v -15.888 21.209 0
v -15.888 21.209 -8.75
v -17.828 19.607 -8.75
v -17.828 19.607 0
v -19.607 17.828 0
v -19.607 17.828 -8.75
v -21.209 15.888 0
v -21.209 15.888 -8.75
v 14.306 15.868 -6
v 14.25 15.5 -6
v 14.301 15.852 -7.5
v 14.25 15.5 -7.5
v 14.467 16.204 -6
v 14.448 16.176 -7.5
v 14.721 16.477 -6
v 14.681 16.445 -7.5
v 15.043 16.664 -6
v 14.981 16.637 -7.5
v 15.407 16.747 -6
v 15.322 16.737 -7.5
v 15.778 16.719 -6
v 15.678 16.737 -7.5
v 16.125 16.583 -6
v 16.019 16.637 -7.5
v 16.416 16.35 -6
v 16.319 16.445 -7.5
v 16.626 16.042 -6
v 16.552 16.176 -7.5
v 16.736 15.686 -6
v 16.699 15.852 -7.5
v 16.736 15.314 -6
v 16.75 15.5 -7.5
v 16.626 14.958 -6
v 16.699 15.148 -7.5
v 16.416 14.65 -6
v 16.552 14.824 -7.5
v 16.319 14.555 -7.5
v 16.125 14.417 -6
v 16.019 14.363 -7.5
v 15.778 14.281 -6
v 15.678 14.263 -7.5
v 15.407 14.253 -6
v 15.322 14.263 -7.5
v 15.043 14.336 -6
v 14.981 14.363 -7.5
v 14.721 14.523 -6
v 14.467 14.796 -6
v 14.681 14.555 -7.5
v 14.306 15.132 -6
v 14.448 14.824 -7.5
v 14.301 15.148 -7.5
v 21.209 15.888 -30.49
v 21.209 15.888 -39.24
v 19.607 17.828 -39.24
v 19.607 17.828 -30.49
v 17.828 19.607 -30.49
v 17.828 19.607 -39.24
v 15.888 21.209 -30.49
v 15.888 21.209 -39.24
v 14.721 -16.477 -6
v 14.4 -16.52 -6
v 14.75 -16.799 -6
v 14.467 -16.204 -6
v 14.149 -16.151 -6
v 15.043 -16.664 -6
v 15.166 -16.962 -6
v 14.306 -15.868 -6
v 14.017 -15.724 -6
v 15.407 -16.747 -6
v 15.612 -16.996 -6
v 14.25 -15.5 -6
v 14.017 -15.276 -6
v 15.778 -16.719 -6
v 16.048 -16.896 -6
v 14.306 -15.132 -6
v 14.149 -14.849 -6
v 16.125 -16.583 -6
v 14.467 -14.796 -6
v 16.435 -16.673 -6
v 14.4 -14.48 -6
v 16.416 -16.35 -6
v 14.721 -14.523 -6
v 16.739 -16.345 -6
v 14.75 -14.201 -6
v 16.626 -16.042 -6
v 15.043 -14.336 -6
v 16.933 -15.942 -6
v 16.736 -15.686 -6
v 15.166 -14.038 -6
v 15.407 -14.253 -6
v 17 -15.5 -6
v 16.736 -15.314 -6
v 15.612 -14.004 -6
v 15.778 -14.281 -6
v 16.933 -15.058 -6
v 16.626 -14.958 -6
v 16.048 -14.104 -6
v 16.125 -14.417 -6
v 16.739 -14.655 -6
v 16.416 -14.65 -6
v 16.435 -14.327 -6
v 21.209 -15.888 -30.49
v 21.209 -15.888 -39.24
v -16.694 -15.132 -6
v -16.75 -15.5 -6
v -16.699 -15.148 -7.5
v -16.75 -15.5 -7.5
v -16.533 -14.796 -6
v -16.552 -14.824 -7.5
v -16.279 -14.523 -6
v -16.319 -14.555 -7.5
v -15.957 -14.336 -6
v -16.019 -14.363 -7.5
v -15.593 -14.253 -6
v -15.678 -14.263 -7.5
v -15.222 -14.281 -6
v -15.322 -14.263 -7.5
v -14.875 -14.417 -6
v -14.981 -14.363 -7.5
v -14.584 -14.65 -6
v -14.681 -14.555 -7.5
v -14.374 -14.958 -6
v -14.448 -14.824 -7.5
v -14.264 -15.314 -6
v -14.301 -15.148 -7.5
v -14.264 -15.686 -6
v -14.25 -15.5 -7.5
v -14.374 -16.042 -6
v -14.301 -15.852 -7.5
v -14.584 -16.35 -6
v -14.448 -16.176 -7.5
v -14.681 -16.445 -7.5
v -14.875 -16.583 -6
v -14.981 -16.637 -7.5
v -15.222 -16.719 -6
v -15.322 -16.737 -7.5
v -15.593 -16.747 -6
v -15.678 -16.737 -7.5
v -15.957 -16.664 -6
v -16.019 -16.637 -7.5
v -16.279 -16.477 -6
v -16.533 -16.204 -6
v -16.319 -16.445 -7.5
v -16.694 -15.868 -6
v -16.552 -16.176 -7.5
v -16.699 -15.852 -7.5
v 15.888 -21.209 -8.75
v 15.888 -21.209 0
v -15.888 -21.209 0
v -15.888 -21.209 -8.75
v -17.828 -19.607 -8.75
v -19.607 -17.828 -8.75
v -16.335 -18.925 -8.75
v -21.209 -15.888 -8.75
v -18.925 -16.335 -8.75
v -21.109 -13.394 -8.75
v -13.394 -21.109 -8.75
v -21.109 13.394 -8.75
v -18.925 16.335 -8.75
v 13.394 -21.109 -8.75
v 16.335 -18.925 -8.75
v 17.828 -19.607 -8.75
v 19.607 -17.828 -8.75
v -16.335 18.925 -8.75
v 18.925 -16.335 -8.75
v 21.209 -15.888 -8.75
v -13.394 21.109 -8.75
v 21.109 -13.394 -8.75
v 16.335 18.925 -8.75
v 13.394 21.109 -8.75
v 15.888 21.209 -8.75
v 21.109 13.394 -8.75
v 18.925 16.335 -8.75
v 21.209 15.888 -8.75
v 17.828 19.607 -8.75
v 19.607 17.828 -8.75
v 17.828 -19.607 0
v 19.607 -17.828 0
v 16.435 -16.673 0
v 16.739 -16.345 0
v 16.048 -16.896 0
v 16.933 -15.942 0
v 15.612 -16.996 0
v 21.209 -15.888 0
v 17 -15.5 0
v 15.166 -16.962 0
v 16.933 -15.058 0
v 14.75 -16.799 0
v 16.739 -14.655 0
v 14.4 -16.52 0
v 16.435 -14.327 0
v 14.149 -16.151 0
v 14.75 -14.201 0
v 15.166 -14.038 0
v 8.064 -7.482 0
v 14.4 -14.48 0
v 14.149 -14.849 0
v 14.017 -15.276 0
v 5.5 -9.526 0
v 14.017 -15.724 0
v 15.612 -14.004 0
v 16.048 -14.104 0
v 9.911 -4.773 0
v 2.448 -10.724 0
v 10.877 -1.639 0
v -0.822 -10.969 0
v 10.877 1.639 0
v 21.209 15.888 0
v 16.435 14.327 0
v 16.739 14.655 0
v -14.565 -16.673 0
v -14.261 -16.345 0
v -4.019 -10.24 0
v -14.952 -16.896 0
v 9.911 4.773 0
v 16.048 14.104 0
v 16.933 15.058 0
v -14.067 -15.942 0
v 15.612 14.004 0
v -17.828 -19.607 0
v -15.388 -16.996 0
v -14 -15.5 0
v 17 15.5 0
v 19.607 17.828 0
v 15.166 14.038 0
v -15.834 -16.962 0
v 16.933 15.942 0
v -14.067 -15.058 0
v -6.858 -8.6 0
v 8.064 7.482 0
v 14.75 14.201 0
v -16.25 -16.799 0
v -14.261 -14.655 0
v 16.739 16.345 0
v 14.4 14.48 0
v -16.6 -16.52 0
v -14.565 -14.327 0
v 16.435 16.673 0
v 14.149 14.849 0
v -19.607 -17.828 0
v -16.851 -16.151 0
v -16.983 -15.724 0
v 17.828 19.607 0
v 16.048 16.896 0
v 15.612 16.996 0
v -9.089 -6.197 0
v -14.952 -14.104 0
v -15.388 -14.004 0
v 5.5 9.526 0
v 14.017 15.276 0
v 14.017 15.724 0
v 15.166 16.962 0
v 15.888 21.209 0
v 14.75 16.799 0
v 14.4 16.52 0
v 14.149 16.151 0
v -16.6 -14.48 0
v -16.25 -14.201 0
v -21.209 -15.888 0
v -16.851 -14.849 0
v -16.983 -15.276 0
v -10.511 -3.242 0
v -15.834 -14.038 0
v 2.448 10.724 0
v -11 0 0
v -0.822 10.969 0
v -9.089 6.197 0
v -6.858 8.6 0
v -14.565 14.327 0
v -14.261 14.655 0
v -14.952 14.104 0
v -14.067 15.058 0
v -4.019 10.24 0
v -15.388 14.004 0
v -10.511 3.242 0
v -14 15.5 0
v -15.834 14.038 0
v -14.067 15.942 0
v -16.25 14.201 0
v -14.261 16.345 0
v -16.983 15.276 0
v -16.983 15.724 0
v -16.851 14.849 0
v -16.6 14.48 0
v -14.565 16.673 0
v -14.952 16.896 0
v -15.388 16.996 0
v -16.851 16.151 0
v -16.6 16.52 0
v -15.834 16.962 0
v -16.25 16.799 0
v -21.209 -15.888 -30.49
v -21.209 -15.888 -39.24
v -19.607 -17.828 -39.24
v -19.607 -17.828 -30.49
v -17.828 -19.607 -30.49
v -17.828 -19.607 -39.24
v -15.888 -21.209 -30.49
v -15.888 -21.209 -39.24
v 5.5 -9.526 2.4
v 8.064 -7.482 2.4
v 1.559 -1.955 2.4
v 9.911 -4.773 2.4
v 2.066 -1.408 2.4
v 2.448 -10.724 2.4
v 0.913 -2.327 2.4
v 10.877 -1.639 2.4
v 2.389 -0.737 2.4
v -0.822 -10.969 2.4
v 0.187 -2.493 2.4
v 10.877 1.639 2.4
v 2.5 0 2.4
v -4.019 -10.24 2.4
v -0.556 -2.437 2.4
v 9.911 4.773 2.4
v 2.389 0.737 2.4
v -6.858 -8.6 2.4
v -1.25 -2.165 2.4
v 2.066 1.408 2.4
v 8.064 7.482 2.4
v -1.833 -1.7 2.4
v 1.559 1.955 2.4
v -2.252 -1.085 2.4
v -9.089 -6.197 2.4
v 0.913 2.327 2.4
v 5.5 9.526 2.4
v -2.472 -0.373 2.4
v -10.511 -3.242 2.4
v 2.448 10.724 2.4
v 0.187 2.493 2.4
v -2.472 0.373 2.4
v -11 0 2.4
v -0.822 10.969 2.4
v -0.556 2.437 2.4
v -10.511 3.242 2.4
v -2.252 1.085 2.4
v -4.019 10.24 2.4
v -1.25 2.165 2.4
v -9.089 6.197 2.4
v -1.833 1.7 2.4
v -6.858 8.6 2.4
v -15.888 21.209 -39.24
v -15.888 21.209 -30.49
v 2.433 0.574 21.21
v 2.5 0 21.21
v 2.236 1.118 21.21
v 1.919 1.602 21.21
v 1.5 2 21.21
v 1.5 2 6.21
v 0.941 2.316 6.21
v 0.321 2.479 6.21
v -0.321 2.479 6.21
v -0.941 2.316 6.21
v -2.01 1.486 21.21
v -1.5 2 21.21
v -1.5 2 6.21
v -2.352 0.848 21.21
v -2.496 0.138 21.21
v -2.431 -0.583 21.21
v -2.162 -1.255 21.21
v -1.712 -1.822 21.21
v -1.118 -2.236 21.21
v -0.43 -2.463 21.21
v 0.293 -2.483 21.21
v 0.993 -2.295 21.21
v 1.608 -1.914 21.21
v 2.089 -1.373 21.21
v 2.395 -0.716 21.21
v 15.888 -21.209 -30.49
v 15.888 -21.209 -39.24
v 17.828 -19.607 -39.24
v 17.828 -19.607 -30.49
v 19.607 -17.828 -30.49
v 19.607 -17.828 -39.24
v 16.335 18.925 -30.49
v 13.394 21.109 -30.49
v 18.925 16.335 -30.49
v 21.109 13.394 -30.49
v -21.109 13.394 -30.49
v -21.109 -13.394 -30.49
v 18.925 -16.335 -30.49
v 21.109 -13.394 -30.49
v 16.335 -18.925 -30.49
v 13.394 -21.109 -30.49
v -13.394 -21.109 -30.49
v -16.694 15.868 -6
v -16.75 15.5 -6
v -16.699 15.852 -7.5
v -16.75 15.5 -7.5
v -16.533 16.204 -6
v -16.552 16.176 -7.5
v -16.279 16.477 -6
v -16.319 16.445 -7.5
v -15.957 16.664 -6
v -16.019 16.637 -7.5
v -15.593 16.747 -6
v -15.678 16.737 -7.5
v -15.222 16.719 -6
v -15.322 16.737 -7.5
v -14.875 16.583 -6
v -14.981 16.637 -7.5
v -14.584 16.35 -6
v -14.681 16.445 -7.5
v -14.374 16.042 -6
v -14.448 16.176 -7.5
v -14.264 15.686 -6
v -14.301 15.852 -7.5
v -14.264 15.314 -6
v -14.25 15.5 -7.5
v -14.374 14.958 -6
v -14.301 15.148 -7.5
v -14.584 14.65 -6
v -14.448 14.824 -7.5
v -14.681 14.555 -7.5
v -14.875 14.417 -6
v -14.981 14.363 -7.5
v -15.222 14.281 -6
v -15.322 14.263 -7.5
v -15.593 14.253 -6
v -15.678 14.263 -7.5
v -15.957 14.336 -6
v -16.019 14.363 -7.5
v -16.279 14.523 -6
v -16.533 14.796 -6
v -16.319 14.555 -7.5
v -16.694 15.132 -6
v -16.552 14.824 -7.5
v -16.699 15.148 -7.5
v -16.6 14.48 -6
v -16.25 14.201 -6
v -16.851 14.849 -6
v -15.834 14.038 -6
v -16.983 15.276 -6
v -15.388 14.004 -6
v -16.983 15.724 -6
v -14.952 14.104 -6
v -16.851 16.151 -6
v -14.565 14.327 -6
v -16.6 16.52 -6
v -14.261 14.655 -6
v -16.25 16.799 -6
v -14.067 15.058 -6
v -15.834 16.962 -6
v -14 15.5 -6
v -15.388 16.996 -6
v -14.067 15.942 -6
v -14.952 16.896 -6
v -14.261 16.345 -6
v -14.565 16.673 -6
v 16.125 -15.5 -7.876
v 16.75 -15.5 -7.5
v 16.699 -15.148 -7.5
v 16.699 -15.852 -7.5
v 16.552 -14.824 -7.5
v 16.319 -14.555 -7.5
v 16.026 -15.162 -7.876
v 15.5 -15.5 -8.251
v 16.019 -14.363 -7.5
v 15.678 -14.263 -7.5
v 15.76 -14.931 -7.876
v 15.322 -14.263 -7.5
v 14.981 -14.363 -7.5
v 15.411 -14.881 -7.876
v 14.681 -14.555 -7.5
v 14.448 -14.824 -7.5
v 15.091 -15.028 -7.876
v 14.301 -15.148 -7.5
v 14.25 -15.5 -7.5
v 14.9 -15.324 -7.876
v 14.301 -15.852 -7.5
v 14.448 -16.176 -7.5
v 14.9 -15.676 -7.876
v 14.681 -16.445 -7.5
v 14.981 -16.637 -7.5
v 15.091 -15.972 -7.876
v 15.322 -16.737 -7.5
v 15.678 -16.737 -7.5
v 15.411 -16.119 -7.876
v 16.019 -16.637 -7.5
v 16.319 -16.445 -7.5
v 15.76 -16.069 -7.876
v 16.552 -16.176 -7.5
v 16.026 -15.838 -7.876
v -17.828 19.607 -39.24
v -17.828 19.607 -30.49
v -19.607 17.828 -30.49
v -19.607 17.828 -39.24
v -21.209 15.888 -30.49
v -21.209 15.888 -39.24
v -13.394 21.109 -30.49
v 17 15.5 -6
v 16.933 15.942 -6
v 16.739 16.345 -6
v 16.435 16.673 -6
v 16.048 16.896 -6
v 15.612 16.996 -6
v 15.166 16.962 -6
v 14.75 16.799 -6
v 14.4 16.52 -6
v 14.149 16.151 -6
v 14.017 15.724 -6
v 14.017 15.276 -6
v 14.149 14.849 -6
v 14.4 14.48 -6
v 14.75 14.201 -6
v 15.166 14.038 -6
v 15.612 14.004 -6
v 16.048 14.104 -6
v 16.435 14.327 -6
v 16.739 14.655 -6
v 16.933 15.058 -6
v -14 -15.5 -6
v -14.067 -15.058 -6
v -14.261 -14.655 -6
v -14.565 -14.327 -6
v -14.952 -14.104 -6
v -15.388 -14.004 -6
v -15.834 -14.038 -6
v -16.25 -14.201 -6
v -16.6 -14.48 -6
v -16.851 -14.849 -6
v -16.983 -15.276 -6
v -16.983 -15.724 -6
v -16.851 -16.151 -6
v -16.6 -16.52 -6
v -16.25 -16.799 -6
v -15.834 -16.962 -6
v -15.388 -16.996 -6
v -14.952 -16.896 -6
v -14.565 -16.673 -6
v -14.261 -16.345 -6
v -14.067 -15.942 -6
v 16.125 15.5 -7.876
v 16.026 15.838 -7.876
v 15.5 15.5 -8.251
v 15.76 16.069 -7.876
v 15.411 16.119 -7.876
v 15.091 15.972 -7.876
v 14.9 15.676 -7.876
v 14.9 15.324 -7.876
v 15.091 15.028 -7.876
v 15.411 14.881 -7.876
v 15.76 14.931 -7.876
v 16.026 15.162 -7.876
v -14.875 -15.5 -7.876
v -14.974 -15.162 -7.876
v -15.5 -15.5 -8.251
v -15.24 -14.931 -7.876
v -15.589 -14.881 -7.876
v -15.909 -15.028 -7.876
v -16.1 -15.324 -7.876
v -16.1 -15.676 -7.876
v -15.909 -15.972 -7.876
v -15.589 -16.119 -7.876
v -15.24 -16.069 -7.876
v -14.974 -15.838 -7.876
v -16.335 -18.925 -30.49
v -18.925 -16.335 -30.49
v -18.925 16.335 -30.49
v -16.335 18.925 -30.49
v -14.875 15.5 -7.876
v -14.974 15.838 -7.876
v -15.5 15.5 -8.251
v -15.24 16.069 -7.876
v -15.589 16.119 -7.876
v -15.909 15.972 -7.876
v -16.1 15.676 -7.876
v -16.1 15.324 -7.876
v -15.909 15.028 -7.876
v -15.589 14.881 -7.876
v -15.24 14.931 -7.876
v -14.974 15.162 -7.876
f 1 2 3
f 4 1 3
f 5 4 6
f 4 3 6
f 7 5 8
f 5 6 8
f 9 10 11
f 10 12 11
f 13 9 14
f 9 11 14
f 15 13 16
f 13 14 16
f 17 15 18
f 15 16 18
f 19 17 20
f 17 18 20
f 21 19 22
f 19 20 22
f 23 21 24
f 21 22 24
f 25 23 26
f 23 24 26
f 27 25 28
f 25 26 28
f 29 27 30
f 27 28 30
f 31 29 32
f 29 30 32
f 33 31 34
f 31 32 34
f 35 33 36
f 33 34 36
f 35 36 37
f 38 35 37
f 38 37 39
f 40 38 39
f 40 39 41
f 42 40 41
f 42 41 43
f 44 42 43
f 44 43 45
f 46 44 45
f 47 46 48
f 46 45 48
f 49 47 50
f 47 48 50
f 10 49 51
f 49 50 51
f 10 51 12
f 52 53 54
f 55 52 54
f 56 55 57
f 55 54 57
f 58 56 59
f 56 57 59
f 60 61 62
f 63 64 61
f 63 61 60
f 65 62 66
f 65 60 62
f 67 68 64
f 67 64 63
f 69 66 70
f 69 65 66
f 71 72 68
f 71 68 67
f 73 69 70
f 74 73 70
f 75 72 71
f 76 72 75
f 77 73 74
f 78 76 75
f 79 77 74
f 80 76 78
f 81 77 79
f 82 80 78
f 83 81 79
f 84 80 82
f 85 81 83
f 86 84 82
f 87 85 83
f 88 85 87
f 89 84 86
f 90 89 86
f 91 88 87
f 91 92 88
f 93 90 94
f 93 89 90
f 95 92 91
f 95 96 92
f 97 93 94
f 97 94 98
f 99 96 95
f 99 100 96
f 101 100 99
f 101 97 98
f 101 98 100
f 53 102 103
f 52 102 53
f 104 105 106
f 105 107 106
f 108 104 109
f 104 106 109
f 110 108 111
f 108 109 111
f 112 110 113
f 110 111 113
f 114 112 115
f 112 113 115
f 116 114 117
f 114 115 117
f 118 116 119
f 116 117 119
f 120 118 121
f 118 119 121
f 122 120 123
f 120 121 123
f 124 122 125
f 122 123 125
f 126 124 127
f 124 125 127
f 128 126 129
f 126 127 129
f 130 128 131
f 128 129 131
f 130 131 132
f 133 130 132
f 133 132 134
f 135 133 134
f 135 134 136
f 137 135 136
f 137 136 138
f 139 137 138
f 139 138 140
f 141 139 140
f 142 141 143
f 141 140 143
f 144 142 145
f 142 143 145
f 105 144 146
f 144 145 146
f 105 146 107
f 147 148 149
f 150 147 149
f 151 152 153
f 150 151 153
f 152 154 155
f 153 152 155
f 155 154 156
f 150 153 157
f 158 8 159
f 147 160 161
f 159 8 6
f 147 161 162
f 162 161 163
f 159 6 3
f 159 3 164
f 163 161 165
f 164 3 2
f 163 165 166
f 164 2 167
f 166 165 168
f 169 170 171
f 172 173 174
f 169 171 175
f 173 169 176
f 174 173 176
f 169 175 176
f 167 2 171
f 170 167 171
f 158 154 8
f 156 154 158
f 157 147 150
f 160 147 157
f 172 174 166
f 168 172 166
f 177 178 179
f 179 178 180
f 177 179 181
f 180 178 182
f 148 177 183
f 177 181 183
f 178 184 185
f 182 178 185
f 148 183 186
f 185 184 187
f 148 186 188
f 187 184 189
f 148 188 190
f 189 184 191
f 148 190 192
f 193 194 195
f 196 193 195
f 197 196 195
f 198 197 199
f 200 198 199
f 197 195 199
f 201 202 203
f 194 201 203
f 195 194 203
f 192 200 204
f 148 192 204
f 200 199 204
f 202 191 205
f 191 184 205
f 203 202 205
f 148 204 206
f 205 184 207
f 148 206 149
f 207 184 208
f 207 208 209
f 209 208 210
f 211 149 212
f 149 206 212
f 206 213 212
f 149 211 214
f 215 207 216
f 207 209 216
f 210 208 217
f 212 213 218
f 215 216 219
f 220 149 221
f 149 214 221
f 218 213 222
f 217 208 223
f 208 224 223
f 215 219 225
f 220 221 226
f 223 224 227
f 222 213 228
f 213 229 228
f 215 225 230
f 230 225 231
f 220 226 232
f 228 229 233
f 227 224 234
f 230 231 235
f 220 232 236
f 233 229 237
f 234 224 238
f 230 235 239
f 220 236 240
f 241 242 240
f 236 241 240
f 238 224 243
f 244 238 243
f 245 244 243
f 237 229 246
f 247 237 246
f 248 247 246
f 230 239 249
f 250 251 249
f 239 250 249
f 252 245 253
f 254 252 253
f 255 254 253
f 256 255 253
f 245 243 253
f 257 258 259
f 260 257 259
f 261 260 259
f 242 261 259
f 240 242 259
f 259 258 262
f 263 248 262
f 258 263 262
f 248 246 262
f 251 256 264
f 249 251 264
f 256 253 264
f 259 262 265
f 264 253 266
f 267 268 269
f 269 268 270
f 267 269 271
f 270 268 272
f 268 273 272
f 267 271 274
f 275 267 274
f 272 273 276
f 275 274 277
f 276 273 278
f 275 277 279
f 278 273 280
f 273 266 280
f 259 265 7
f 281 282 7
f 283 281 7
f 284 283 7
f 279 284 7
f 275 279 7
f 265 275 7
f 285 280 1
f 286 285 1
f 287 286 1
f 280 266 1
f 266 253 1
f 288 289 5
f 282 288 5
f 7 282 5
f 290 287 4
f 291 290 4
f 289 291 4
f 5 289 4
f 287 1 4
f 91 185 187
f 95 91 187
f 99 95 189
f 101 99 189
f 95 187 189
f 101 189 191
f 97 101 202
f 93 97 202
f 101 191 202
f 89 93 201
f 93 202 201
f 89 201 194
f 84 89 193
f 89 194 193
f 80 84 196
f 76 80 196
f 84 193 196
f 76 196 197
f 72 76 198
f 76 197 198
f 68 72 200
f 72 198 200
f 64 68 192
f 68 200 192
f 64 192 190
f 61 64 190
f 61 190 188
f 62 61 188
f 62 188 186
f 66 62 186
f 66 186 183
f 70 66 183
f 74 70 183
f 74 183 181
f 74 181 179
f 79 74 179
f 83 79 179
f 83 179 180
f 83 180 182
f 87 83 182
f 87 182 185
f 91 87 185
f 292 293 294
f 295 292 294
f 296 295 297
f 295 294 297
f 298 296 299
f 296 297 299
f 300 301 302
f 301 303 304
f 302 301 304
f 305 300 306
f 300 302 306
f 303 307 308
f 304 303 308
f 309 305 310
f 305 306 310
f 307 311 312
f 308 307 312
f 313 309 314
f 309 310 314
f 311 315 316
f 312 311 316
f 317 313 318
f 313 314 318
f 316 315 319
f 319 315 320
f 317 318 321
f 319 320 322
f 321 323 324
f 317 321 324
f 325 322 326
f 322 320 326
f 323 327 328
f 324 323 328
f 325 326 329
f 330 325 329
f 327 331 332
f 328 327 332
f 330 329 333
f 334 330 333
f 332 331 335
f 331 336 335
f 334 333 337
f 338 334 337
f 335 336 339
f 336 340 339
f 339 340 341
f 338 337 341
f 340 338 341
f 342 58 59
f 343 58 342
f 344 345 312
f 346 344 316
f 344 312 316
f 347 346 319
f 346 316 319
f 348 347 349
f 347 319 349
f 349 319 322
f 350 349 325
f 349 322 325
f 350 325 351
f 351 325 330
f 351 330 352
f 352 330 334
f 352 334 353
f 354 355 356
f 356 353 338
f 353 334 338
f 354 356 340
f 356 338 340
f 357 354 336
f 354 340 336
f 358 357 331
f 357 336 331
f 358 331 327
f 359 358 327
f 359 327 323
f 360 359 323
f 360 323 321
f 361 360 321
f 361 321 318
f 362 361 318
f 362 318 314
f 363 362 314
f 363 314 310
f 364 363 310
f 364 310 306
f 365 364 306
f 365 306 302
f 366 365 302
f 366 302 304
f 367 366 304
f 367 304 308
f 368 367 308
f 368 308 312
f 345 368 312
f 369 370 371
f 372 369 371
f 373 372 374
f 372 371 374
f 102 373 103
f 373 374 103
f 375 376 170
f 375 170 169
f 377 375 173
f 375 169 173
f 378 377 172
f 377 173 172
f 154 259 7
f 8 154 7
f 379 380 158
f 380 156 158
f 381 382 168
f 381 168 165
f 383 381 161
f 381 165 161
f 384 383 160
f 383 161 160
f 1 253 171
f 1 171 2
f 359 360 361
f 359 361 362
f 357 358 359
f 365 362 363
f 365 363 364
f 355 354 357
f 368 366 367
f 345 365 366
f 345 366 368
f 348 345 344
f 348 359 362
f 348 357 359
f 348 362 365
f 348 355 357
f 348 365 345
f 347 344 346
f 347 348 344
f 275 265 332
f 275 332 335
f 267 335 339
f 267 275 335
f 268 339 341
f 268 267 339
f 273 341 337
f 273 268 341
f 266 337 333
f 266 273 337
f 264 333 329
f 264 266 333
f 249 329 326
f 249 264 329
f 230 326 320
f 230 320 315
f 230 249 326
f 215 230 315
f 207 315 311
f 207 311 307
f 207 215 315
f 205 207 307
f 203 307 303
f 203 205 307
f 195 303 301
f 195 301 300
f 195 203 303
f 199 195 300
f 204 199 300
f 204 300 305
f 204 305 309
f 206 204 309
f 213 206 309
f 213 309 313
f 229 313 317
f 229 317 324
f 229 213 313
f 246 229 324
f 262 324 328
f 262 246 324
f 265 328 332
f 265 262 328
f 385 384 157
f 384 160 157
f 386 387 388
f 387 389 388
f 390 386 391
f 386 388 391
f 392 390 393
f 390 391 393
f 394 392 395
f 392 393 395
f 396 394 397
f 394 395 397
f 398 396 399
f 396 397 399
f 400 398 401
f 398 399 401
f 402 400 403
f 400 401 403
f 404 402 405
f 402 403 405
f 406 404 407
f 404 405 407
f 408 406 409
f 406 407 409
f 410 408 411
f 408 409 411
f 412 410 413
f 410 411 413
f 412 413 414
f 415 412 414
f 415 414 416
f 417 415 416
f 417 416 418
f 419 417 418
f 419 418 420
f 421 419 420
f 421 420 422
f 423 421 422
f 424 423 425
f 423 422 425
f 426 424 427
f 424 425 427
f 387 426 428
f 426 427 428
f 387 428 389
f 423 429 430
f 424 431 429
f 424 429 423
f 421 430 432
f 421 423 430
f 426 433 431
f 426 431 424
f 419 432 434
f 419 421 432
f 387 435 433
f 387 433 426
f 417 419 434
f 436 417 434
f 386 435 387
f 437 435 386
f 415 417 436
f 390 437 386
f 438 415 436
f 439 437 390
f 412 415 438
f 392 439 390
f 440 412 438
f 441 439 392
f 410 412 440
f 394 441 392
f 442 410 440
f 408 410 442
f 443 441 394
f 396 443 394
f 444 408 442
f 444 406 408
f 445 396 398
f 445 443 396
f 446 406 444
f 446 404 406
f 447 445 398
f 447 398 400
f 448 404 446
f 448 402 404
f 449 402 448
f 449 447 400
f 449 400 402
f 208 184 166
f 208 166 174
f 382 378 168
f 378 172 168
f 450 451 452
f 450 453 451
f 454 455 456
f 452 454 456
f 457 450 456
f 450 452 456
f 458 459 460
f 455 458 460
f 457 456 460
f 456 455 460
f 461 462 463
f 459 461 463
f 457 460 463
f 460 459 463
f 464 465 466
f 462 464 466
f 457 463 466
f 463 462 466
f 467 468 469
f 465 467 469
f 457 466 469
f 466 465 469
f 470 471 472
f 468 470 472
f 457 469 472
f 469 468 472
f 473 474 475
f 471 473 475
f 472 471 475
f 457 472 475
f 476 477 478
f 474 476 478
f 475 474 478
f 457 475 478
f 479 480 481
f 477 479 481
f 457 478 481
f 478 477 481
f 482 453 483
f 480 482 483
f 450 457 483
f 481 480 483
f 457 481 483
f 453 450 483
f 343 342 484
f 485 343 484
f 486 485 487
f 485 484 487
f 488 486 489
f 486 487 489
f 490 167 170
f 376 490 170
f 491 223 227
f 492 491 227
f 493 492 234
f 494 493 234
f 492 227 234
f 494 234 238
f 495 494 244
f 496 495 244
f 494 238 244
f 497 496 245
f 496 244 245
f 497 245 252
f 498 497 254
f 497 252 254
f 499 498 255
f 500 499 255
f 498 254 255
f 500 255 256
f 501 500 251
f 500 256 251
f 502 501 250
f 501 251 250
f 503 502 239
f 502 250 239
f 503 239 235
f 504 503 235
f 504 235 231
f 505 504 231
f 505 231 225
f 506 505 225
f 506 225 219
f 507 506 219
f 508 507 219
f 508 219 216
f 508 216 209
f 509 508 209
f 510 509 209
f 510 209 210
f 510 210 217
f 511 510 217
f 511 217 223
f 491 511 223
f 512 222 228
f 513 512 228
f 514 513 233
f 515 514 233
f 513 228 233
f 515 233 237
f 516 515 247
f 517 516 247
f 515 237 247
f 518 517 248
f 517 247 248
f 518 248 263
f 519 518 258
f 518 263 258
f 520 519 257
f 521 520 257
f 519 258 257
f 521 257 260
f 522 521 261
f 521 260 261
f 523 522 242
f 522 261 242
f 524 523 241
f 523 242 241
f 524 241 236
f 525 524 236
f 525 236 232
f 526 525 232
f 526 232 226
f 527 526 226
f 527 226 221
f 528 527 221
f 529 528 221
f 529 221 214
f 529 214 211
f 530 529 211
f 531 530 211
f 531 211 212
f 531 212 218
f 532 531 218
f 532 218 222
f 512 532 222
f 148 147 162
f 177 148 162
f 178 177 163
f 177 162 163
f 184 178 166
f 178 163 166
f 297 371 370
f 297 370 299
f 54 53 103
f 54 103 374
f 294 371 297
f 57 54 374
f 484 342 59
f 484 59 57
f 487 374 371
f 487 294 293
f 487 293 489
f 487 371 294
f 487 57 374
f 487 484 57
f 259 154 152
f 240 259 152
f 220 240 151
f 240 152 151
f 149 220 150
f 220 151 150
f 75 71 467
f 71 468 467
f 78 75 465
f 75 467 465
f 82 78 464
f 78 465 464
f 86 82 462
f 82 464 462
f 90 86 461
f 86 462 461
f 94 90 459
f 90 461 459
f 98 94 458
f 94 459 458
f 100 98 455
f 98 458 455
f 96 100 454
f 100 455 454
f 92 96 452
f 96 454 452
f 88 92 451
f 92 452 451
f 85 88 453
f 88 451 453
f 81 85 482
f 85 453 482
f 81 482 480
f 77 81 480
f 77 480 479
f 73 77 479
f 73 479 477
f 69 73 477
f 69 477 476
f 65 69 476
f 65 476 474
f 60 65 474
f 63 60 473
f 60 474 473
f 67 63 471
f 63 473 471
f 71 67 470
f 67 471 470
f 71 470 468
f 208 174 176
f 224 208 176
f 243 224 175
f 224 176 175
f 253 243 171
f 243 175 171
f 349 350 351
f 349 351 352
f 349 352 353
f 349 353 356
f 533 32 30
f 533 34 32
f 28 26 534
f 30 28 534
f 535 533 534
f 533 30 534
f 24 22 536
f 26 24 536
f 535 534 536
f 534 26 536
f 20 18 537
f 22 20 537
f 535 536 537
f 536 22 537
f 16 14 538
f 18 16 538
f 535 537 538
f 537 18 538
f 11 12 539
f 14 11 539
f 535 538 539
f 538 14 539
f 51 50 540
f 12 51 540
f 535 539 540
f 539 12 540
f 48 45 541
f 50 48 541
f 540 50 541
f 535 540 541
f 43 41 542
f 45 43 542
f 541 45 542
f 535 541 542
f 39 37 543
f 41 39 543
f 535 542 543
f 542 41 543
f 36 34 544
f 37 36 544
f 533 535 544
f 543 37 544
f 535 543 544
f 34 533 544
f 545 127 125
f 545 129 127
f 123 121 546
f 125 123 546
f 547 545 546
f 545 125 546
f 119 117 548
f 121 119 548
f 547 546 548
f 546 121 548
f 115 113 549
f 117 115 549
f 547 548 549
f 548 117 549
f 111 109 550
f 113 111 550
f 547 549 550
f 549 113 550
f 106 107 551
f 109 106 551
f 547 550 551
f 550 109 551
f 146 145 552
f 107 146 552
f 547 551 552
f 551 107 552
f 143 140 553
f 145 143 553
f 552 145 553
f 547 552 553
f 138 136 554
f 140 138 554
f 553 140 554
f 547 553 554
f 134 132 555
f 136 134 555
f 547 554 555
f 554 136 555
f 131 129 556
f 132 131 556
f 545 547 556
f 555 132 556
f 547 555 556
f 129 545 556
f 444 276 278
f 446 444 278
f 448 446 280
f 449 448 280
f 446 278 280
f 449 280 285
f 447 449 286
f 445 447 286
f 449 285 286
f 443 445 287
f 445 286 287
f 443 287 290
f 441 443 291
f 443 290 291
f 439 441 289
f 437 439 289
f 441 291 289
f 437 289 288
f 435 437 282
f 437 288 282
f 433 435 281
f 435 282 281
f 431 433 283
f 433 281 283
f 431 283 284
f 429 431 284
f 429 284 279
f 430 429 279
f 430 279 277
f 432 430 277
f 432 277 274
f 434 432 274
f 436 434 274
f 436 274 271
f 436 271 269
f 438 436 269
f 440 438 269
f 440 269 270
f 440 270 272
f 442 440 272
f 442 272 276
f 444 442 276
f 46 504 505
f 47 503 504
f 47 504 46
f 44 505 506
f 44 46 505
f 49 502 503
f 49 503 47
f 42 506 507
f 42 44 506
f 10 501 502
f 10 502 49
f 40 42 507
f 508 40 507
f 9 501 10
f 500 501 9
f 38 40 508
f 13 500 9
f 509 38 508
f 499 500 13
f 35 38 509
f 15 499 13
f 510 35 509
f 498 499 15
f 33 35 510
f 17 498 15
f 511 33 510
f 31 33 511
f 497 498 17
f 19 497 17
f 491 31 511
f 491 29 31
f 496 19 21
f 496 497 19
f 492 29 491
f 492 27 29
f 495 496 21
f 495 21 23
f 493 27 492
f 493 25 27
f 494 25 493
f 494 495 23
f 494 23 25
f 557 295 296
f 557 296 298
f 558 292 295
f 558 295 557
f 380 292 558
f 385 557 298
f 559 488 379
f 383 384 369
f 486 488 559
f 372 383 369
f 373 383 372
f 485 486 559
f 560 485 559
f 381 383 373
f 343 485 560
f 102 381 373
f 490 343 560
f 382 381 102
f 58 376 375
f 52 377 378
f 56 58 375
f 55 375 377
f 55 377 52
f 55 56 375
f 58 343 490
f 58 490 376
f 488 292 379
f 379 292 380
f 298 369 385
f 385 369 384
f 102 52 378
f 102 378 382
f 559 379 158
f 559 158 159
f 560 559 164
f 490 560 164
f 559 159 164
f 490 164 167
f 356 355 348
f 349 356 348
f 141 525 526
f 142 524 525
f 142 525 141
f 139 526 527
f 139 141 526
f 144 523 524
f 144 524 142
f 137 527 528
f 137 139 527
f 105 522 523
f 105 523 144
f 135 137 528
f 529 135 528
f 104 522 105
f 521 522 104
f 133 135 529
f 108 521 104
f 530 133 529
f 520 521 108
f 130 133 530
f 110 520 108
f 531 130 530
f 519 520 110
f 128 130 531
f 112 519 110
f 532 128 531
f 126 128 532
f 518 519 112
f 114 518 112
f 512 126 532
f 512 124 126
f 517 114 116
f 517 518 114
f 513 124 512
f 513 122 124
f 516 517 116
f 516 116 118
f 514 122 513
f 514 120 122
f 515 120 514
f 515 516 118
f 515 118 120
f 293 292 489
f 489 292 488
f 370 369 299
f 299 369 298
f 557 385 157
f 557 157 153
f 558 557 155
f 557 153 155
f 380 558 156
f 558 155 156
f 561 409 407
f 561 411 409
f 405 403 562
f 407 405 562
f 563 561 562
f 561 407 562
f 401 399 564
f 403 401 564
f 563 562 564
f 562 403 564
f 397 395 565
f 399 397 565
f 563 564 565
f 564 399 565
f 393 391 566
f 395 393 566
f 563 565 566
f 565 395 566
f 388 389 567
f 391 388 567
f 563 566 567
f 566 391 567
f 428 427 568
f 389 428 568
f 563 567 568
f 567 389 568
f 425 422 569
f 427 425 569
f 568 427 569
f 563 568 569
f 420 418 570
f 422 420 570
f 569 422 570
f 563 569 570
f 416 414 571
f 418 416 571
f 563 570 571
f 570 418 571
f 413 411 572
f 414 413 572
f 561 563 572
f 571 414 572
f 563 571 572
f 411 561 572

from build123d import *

# Parameters (mm, degrees)
SKETCH1_R                       = 2.5
BOSS_EXTRUDE1_DEPTH             = 21.21
SKETCH2_R                       = 11
BOSS_EXTRUDE2_DEPTH             = 2.4
SKETCH3_W                       = 42.418
SKETCH3_H                       = 42.418
BOSS_EXTRUDE3_DEPTH             = 39.24
CUT_EXTRUDE1_DEPTH              = 61.45
M3X0_5_TAPPED_HOLE1_D           = 2.5
M3X0_5_TAPPED_HOLE1_DEPTH       = 7.5
M3X0_5_TAPPED_HOLE1_CBORE_D     = 3
M3X0_5_TAPPED_HOLE1_CBORE_DEPTH = 6
M3X0_5_TAPPED_HOLE1_TIP         = 0.751075774
CUT_EXTRUDE2_DEPTH              = 15
CUT_EXTRUDE3_DEPTH              = 10.87


with BuildPart() as part:
    # Sketch1 → Boss-Extrude1 (new body)
    with BuildSketch(Plane.XY):
        Circle(SKETCH1_R)
    extrude(amount=BOSS_EXTRUDE1_DEPTH)

    # Sketch2 → Boss-Extrude2 (add)
    with BuildSketch(Plane(origin=(0, 0, 0), x_dir=(-1, 0, 0), z_dir=(0, 0, -1))):
        Circle(SKETCH2_R)
    extrude(amount=-BOSS_EXTRUDE2_DEPTH)

    # Sketch3 → Boss-Extrude3 (add)
    with BuildSketch(Plane(origin=(0, 0, 0), x_dir=(-1, 0, 0), z_dir=(0, 0, -1))):
        Rectangle(SKETCH3_W, SKETCH3_H)
    extrude(amount=BOSS_EXTRUDE3_DEPTH)

    # Sketch4 → Cut-Extrude1 (cut, through all)
    with BuildSketch(Plane(origin=(0, 0, -39.24), x_dir=(-1, 0, 0), z_dir=(0, 0, -1))):
        with BuildLine():
            Line((-21.209, -15.887992919), (-21.209, -21.209))
            Line((-21.209, -21.209), (-15.887992919, -21.209))
            ThreePointArc((-15.887992919, -21.209), (-18.738329701, -18.738329701), (-21.209, -15.887992919))
        make_face()
        with BuildLine():
            Line((15.887992919, -21.209), (21.209, -21.209))
            Line((21.209, -21.209), (21.209, -15.887992919))
            ThreePointArc((21.209, -15.887992919), (18.738329701, -18.738329701), (15.887992919, -21.209))
        make_face()
        with BuildLine():
            Line((21.209, 15.887992919), (21.209, 21.209))
            Line((21.209, 21.209), (15.887992919, 21.209))
            ThreePointArc((15.887992919, 21.209), (18.738329701, 18.738329701), (21.209, 15.887992919))
        make_face()
        with BuildLine():
            Line((-15.887992919, 21.209), (-21.209, 21.209))
            Line((-21.209, 21.209), (-21.209, 15.887992919))
            ThreePointArc((-21.209, 15.887992919), (-18.738329701, 18.738329701), (-15.887992919, 21.209))
        make_face()
    extrude(amount=-CUT_EXTRUDE1_DEPTH, mode=Mode.SUBTRACT)

    # M3x0.5 Tapped Hole1
    with Locations(Plane.XY):
        with Locations((-15.5, 15.5), (-15.5, -15.5), (15.5, -15.5), (15.5, 15.5)):
            CounterBoreHole(M3X0_5_TAPPED_HOLE1_D / 2, M3X0_5_TAPPED_HOLE1_CBORE_D / 2, M3X0_5_TAPPED_HOLE1_CBORE_DEPTH, depth=M3X0_5_TAPPED_HOLE1_DEPTH)
            with Locations((0, 0, -(M3X0_5_TAPPED_HOLE1_DEPTH + M3X0_5_TAPPED_HOLE1_TIP / 2))):  # 118° drill point
                Cone(0, M3X0_5_TAPPED_HOLE1_D / 2, M3X0_5_TAPPED_HOLE1_TIP, mode=Mode.SUBTRACT)

    # Sketch7 → Cut-Extrude2 (cut)
    with BuildSketch(Plane.XY.offset(21.21)):
        with BuildLine():
            Line((-1.5, 2), (1.5, 2))
            ThreePointArc((1.5, 2), (0, 2.5), (-1.5, 2))
        make_face()
    extrude(amount=-CUT_EXTRUDE2_DEPTH, mode=Mode.SUBTRACT)

    # Sketch8 → Cut-Extrude3 (cut, symmetric)
    with BuildSketch(Plane.XY.offset(-19.62)):
        with BuildLine():
            Line((15.887992919, 21.209), (-15.887992919, 21.209))
            ThreePointArc((-15.887992919, 21.209), (-18.738329701, 18.738329701), (-21.209, 15.887992919))
            Line((-21.209, 15.887992919), (-21.209, -15.887992919))
            ThreePointArc((-21.209, -15.887992919), (-18.738329701, -18.738329701), (-15.887992919, -21.209))
            Line((-15.887992919, -21.209), (15.887992919, -21.209))
            ThreePointArc((15.887992919, -21.209), (18.738329701, -18.738329701), (21.209, -15.887992919))
            Line((21.209, -15.887992919), (21.209, 15.887992919))
            ThreePointArc((21.209, 15.887992919), (18.738329701, 18.738329701), (15.887992919, 21.209))
        make_face()
        with BuildLine():
            Line((-13.394406258, 21.109), (13.394406258, 21.109))
            ThreePointArc((13.394406258, 21.109), (17.67766953, 17.67766953), (21.109, 13.394406258))
            Line((21.109, 13.394406258), (21.109, -13.394406258))
            ThreePointArc((21.109, -13.394406258), (17.67766953, -17.67766953), (13.394406258, -21.109))
            Line((13.394406258, -21.109), (-13.394406258, -21.109))
            ThreePointArc((-13.394406258, -21.109), (-17.67766953, -17.67766953), (-21.109, -13.394406258))
            Line((-21.109, -13.394406258), (-21.109, 13.394406258))
            ThreePointArc((-21.109, 13.394406258), (-17.67766953, 17.67766953), (-13.394406258, 21.109))
        make_face(mode=Mode.SUBTRACT)
    extrude(amount=CUT_EXTRUDE3_DEPTH, both=True, mode=Mode.SUBTRACT)


solid = part.part
